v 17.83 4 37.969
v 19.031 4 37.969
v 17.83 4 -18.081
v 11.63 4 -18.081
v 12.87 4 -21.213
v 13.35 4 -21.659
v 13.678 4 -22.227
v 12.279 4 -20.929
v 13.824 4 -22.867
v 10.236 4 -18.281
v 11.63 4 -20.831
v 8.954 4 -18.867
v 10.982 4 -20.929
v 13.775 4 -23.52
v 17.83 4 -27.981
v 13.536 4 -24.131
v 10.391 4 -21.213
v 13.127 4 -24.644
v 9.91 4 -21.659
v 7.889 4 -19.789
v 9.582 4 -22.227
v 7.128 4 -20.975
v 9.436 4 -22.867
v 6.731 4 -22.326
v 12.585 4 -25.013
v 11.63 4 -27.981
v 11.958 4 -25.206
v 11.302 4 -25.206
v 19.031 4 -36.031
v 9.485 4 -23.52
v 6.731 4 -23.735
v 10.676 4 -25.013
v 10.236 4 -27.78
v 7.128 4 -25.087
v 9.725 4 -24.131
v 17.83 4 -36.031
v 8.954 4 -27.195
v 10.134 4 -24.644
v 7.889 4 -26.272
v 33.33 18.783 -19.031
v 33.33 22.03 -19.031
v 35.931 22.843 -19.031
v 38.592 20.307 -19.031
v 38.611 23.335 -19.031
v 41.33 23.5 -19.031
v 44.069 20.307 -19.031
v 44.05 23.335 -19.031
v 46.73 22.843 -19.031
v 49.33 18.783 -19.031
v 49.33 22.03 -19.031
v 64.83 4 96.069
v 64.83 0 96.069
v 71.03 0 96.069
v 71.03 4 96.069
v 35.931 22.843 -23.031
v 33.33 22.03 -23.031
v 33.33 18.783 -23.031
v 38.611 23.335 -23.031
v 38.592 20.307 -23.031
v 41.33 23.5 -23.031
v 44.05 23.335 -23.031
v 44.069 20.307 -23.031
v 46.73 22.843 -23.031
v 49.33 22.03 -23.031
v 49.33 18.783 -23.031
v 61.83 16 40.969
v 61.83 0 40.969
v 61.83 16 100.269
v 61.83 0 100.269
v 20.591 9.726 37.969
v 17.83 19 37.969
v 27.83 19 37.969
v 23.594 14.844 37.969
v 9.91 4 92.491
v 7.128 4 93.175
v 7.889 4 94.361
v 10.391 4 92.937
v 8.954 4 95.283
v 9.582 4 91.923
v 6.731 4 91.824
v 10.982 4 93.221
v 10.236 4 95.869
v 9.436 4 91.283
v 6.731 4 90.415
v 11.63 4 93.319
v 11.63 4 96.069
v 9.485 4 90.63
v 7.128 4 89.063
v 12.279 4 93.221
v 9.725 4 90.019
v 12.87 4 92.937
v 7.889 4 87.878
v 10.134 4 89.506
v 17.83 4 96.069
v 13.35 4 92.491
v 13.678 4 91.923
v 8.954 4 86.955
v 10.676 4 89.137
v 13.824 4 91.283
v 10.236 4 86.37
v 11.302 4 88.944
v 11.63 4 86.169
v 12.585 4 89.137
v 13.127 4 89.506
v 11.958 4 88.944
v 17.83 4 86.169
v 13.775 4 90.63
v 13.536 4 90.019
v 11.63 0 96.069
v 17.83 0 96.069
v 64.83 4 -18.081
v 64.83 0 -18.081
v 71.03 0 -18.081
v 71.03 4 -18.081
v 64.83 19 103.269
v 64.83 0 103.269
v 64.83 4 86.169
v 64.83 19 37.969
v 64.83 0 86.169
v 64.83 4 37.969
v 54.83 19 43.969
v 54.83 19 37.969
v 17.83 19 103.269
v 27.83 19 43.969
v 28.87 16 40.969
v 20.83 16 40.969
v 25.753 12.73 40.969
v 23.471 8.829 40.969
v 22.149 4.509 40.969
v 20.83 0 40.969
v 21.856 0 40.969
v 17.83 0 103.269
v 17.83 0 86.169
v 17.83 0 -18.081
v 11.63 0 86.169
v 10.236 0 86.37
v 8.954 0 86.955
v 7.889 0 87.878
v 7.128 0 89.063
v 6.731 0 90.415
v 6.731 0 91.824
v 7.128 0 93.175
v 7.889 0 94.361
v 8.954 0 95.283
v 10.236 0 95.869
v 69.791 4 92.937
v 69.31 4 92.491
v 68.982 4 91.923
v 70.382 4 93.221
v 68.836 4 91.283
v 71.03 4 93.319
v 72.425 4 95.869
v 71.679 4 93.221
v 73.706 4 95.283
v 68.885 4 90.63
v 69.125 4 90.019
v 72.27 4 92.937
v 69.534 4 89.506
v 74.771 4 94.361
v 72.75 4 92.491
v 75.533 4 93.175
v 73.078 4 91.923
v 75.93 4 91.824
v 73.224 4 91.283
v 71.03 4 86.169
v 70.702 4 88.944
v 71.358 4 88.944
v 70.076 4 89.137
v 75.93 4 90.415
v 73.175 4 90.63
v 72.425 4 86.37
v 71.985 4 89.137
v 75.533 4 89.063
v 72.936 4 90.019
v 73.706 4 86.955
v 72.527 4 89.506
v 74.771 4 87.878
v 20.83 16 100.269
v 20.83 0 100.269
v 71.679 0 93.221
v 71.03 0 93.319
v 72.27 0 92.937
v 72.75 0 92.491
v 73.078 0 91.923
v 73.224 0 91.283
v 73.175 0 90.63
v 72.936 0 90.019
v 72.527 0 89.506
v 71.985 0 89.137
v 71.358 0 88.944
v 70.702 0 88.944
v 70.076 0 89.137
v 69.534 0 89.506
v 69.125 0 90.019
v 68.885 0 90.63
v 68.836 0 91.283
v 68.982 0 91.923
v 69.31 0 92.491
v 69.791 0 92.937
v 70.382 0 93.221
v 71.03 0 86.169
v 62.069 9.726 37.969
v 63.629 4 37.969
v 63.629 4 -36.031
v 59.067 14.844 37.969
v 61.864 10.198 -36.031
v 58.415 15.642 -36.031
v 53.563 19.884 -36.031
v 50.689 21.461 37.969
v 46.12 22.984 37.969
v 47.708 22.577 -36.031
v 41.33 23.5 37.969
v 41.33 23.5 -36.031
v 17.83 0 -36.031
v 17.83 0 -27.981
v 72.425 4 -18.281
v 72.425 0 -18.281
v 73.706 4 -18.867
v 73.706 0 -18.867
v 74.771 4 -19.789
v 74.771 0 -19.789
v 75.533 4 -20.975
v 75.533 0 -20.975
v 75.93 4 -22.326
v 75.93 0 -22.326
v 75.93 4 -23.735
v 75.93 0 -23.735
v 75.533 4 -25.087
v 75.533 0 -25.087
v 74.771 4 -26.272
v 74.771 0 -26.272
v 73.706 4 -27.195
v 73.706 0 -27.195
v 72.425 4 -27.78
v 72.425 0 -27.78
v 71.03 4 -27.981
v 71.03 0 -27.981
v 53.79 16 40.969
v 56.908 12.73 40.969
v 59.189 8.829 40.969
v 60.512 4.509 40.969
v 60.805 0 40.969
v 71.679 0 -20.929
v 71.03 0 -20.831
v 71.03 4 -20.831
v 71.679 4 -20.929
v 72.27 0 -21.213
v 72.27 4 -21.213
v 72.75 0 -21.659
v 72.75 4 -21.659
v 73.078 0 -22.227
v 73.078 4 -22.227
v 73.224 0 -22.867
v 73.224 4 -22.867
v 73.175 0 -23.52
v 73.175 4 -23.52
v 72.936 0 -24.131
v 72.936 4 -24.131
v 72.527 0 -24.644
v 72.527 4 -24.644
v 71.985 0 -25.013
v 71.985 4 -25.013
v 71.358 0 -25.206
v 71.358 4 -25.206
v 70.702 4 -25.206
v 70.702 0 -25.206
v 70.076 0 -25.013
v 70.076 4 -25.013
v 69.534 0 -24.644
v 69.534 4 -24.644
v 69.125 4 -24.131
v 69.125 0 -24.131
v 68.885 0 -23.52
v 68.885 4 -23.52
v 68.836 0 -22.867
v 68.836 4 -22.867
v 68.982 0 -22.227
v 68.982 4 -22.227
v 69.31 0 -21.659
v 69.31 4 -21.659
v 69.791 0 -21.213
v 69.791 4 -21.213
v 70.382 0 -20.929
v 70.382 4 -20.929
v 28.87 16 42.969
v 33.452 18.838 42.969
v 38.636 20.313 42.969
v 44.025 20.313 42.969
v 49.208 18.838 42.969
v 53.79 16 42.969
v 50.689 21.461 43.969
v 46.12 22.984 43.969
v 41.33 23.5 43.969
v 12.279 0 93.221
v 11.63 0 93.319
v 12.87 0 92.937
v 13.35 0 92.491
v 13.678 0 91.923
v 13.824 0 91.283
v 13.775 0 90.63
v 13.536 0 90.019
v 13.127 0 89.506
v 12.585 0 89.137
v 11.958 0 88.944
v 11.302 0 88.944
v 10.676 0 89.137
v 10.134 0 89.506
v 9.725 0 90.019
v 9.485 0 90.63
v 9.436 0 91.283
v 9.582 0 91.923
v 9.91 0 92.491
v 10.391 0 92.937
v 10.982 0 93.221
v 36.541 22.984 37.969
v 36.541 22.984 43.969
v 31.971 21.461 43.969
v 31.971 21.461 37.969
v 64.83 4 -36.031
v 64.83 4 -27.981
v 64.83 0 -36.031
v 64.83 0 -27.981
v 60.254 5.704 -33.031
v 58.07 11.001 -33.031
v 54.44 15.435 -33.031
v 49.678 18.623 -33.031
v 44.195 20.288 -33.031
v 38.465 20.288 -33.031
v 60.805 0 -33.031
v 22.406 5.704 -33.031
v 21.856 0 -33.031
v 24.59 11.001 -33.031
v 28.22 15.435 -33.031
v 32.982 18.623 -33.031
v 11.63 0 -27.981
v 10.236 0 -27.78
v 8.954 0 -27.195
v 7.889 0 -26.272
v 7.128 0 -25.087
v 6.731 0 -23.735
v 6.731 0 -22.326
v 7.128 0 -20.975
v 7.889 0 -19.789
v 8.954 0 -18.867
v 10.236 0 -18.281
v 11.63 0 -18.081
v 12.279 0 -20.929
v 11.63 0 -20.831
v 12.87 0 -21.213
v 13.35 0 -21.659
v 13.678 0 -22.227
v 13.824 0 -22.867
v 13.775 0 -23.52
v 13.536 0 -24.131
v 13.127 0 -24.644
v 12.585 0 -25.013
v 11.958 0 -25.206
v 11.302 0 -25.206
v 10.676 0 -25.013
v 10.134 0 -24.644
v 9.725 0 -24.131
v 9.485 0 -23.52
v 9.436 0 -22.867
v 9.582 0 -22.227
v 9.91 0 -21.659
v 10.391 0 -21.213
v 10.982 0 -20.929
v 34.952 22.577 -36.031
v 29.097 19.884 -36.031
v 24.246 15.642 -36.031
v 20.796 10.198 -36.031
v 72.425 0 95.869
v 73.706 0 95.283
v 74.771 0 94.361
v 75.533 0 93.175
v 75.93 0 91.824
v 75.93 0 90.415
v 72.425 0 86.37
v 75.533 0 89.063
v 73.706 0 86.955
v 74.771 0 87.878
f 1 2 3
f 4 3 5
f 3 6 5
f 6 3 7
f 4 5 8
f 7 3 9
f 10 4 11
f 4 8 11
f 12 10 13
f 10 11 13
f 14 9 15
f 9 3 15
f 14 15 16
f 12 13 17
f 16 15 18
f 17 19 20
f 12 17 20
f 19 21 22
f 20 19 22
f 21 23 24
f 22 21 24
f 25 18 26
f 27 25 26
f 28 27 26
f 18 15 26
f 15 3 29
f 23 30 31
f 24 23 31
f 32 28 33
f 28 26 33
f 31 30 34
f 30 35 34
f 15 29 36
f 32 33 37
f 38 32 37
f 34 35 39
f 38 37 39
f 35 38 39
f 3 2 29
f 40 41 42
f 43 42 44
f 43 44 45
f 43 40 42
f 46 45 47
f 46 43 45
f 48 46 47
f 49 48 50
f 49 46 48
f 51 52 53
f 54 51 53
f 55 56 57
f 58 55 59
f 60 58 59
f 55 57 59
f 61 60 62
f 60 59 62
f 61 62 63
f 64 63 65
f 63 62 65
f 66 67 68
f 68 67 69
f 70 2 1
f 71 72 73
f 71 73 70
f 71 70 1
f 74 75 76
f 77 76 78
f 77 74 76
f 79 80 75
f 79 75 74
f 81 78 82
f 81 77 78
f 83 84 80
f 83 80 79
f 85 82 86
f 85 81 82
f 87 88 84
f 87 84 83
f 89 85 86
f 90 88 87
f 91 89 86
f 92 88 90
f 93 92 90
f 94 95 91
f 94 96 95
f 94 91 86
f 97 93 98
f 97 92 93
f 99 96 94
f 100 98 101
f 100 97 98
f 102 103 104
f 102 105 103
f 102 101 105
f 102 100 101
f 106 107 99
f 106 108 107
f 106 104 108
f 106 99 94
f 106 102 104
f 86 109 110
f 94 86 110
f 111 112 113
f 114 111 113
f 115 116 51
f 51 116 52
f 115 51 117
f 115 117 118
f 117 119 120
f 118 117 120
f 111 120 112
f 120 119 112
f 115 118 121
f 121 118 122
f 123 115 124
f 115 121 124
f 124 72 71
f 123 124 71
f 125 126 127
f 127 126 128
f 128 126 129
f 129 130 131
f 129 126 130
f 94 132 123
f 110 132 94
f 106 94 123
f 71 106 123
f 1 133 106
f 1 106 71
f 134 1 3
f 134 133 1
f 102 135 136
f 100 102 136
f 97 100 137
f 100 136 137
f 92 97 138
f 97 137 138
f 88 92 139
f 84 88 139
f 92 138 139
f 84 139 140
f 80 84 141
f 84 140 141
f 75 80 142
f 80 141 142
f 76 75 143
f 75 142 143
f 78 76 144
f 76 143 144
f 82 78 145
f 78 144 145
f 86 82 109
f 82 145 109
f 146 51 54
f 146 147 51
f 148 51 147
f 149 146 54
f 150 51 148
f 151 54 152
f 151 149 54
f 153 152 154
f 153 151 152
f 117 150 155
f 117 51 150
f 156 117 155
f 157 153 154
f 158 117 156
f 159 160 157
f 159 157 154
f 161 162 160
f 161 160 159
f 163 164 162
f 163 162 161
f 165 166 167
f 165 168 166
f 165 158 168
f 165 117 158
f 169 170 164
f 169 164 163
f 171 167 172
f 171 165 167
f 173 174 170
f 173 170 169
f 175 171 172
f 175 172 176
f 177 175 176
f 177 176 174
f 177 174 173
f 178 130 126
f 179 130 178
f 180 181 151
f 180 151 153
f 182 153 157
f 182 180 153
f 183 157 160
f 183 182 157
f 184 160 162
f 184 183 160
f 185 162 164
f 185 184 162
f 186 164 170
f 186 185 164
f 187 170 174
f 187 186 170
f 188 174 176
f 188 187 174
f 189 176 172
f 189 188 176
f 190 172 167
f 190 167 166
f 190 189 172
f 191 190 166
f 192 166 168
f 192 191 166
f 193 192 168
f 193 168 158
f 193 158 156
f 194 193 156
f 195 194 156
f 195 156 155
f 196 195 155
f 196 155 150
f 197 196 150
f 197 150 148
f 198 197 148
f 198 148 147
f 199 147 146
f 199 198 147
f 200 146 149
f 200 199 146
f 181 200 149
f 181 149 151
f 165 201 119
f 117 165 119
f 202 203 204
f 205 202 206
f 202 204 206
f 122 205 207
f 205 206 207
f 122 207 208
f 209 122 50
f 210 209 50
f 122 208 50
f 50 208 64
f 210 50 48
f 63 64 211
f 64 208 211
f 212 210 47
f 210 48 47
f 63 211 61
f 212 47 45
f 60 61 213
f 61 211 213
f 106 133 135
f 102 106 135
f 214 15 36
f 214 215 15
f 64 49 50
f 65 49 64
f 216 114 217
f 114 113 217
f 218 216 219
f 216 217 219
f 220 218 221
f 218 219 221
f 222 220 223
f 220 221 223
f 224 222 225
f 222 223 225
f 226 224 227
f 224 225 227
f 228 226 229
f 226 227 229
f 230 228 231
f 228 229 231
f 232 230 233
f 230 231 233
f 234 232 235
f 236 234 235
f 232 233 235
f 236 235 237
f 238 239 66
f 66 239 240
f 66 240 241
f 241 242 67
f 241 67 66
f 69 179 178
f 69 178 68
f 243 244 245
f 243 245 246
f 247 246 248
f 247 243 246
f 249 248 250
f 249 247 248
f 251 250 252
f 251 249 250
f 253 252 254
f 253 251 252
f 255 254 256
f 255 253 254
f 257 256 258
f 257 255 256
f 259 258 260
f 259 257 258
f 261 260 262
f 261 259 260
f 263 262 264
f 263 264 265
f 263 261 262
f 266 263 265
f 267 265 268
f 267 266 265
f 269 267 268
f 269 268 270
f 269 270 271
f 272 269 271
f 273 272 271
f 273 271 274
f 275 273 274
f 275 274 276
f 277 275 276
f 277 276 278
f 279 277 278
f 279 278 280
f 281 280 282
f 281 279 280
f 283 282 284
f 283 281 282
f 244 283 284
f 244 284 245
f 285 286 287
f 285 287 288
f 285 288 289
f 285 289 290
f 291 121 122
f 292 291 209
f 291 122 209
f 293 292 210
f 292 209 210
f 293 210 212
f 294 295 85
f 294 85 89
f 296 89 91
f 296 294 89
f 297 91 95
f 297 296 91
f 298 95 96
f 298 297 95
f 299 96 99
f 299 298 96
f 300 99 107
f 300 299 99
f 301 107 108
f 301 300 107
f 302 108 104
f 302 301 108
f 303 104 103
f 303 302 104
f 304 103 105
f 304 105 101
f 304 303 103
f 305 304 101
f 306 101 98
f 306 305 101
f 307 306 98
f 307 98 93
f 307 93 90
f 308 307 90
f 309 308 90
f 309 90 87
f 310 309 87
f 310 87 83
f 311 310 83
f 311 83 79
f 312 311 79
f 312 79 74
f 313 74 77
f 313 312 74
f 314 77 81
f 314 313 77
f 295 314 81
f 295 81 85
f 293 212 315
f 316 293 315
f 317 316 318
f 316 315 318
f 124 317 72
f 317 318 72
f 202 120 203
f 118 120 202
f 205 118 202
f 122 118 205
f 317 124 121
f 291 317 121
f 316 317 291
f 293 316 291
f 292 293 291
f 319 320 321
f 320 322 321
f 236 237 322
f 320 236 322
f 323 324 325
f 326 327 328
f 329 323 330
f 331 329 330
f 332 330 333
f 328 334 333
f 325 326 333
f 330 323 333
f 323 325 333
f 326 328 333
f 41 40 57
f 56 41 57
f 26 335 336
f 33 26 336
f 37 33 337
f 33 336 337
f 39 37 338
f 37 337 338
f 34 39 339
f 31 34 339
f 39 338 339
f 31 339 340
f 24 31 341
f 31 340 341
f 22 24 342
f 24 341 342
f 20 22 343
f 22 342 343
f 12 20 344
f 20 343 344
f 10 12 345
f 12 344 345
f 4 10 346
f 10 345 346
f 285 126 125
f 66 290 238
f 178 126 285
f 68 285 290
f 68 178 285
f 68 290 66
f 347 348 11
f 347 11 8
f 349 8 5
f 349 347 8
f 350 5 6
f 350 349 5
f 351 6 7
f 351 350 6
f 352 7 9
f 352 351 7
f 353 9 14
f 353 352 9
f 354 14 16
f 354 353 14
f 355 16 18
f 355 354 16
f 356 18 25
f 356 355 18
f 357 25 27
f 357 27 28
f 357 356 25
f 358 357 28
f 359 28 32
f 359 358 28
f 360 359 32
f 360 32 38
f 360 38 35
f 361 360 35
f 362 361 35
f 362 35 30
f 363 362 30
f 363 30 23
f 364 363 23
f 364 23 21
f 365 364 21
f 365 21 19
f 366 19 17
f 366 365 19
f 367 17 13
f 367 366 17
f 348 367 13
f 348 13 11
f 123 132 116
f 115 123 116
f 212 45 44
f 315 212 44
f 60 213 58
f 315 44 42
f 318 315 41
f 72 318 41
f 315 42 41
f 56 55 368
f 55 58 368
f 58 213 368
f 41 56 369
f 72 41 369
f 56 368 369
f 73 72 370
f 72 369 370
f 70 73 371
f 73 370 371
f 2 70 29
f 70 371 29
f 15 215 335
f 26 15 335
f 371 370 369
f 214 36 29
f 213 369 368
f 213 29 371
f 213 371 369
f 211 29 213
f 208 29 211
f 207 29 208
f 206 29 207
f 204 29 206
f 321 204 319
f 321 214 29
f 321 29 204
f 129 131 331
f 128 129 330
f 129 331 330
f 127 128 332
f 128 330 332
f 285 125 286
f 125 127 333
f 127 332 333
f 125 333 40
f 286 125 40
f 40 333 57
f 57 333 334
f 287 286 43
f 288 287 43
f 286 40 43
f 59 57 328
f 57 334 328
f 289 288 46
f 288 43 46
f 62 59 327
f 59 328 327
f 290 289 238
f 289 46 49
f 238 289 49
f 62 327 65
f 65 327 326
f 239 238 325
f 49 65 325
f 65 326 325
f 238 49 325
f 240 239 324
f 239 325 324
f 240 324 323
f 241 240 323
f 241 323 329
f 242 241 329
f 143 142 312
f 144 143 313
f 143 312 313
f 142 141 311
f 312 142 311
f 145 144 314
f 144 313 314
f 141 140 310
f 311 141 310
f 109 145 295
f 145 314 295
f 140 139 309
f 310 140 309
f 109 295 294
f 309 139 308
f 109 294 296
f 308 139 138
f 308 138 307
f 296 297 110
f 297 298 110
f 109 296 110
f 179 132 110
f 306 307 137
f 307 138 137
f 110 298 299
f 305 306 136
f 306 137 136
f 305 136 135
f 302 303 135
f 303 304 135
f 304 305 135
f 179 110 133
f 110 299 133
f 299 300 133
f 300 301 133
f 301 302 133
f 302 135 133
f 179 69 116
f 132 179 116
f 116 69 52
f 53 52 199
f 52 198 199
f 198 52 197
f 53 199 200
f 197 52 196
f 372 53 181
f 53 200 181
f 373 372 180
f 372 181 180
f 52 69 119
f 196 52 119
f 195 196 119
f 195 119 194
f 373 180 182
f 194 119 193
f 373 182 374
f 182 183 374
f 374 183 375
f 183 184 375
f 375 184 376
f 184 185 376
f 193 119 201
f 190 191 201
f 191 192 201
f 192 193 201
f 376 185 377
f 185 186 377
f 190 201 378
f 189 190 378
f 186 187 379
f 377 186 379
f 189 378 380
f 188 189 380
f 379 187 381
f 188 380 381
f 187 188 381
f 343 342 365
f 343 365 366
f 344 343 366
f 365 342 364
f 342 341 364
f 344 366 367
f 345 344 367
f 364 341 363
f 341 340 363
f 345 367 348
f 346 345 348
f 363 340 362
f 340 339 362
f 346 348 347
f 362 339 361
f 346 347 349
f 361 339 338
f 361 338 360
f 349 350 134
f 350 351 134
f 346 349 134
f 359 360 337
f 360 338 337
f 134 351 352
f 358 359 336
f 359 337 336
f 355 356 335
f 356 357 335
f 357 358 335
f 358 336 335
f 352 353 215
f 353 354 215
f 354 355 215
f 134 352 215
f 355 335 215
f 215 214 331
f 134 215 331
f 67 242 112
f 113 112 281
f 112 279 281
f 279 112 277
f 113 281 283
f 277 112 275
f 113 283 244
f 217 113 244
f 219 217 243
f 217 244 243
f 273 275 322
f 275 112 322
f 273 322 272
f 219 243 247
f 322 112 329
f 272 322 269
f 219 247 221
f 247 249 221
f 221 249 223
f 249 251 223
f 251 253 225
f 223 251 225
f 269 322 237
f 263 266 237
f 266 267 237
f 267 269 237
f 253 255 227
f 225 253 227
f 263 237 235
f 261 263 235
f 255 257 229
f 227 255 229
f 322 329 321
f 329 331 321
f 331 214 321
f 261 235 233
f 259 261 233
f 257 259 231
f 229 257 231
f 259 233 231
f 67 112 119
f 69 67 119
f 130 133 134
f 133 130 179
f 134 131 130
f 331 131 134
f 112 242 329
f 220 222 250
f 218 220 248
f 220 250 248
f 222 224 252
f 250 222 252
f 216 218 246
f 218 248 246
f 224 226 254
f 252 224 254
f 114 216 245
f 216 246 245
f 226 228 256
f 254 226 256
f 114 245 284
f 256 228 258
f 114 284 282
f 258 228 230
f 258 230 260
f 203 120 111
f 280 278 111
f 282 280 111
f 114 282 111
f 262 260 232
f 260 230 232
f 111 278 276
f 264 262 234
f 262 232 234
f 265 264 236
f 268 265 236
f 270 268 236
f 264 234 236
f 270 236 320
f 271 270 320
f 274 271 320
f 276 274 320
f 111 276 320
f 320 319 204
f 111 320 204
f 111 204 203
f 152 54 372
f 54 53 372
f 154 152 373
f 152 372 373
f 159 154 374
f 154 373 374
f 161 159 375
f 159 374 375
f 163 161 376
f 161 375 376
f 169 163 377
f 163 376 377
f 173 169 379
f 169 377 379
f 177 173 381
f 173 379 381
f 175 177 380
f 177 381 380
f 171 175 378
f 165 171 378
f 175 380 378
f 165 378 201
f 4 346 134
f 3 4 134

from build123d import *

# Parameters (mm, degrees)
SKETCH1_R               = 4.95
SKETCH1_R_2             = 2.2
BOSS_EXTRUDE1_DEPTH     = 4
SKETCH2_W               = 47
SKETCH2_H               = 139.3
BOSS_EXTRUDE2_DEPTH     = 19.5
SKETCH3_W               = 41
SKETCH3_H               = 59.3
CUT_EXTRUDE1_DEPTH      = 16
CUT_EXTRUDE3_START      = -3
SKETCH6_R               = 19.5
CUT_EXTRUDE3_DEPTH      = 76
CUT_EXTRUDE4_DEPTH      = 74
CUT_EXTRUDE6_REACH      = 110.634
CUT_EXTRUDE7_DEPTH      = 130.68327973
CUT_EXTRUDE7_DEPTH_BACK = 130.68327973
SKETCH10_W              = 16
SKETCH10_H              = 4
SKETCH12_W              = 47
SKETCH12_H              = 59.3
CUT_EXTRUDE8_DEPTH      = 130.609039197


with BuildPart() as part:
    # Sketch1 → Boss-Extrude1 (new body)
    # profile 1 of 9: a face of its own
    with BuildSketch(Plane(origin=(0, 0, 0), x_dir=(1, 0, 0), z_dir=(0, 1, 0))):
        with Locations((11.630264395, 23.030922034)):
            Circle(SKETCH1_R)
        with Locations(Location((11.630264395, 23.030922034, 0), (0, 0, 270))):
            Circle(SKETCH1_R_2, mode=Mode.SUBTRACT)
    # profile 2 of 9: a face of its own
    with BuildSketch(Plane(origin=(0, 0, 0), x_dir=(1, 0, 0), z_dir=(0, 1, 0))):
        with BuildLine():
            Line((17.830264395, 18.080922034), (17.830264395, 27.980922034))
            Line((17.830264395, 27.980922034), (11.630264395, 27.980922034))
            ThreePointArc((11.630264395, 27.980922034), (15.130442962, 26.5311006), (16.580264395, 23.030922034))
            ThreePointArc((16.580264395, 23.030922034), (15.130442962, 19.530743467), (11.630264395, 18.080922034))
            Line((11.630264395, 18.080922034), (17.830264395, 18.080922034))
        make_face()
    # profile 3 of 9: a face of its own
    with BuildSketch(Plane(origin=(0, 0, 0), x_dir=(1, 0, 0), z_dir=(0, 1, 0))):
        Polygon((64.830264395, -86.169077966), (64.830264395, 18.080922034), (64.830264395, 27.980922034), (64.830264395, 36.030922034), (17.830264395, 36.030922034), (17.830264395, 27.980922034), (17.830264395, 18.080922034), (17.830264395, -86.169077966), (17.830264395, -96.069077966), (17.830264395, -103.269077966), (64.830264395, -103.269077966), (64.830264395, -96.069077966), align=None)
    # profile 4 of 9: a face of its own
    with BuildSketch(Plane(origin=(0, 0, 0), x_dir=(1, 0, 0), z_dir=(0, 1, 0))):
        with Locations((71.030264395, 23.030922034)):
            Circle(SKETCH1_R)
        with Locations(Location((71.030264395, 23.030922034, 0), (0, 0, 270))):
            Circle(SKETCH1_R_2, mode=Mode.SUBTRACT)
    # profile 5 of 9: a face of its own
    with BuildSketch(Plane(origin=(0, 0, 0), x_dir=(1, 0, 0), z_dir=(0, 1, 0))):
        with BuildLine():
            Line((64.830264395, 18.080922034), (71.030264395, 18.080922034))
            ThreePointArc((71.030264395, 18.080922034), (66.080264395, 23.030922034), (71.030264395, 27.980922034))
            Line((71.030264395, 27.980922034), (64.830264395, 27.980922034))
            Line((64.830264395, 27.980922034), (64.830264395, 18.080922034))
        make_face()
    # profile 6 of 9: a face of its own
    with BuildSketch(Plane(origin=(0, 0, 0), x_dir=(1, 0, 0), z_dir=(0, 1, 0))):
        with BuildLine():
            Line((71.030264395, -86.169077966), (64.830264395, -86.169077966))
            Line((64.830264395, -86.169077966), (64.830264395, -96.069077966))
            Line((64.830264395, -96.069077966), (71.030264395, -96.069077966))
            ThreePointArc((71.030264395, -96.069077966), (66.080264395, -91.119077966), (71.030264395, -86.169077966))
        make_face()
    # profile 7 of 9: a face of its own
    with BuildSketch(Plane(origin=(0, 0, 0), x_dir=(1, 0, 0), z_dir=(0, 1, 0))):
        with Locations((71.030264395, -91.119077966)):
            Circle(SKETCH1_R)
        with Locations(Location((71.030264395, -91.119077966, 0), (0, 0, 270))):
            Circle(SKETCH1_R_2, mode=Mode.SUBTRACT)
    # profile 8 of 9: a face of its own
    with BuildSketch(Plane(origin=(0, 0, 0), x_dir=(1, 0, 0), z_dir=(0, 1, 0))):
        with BuildLine():
            Line((11.630264395, -96.069077966), (17.830264395, -96.069077966))
            Line((17.830264395, -96.069077966), (17.830264395, -86.169077966))
            Line((17.830264395, -86.169077966), (11.630264395, -86.169077966))
            ThreePointArc((11.630264395, -86.169077966), (15.130442962, -87.6188994), (16.580264395, -91.119077966))
            ThreePointArc((16.580264395, -91.119077966), (15.130442962, -94.619256533), (11.630264395, -96.069077966))
        make_face()
    # profile 9 of 9: a face of its own
    with BuildSketch(Plane(origin=(0, 0, 0), x_dir=(1, 0, 0), z_dir=(0, 1, 0))):
        with Locations((11.630264395, -91.119077966)):
            Circle(SKETCH1_R)
        with Locations(Location((11.630264395, -91.119077966, 0), (0, 0, 270))):
            Circle(SKETCH1_R_2, mode=Mode.SUBTRACT)
    extrude(amount=BOSS_EXTRUDE1_DEPTH)

    # Sketch2 → Boss-Extrude2 (add)
    with BuildSketch(Plane(origin=(0, 4, 0), x_dir=(1, 0, 0), z_dir=(0, 1, 0))):
        with Locations((41.330264395, -33.619077966)):
            Rectangle(SKETCH2_W, SKETCH2_H)
    extrude(amount=BOSS_EXTRUDE2_DEPTH)

    # Sketch3 → Cut-Extrude1 (cut)
    with BuildSketch(Plane.XZ):
        with Locations((41.330264395, 70.619077966)):
            Rectangle(SKETCH3_W, SKETCH3_H)
    extrude(amount=-CUT_EXTRUDE1_DEPTH, mode=Mode.SUBTRACT)

    # Sketch6 → Cut-Extrude3 (cut)
    with BuildSketch(Plane(origin=(0, 0, -36.030922034), x_dir=(-1, 0, 0), z_dir=(0, 0, -1)).offset(CUT_EXTRUDE3_START)):
        with Locations((-41.330264395, 1)):
            Circle(SKETCH6_R)
    extrude(amount=-CUT_EXTRUDE3_DEPTH, mode=Mode.SUBTRACT)

    # Sketch7 → Cut-Extrude4 (cut)
    with BuildSketch(Plane(origin=(0, 0, -36.030922034), x_dir=(-1, 0, 0), z_dir=(0, 0, -1))):
        with BuildLine():
            Line((-64.830264395, 23.5), (-64.830264395, 4))
            Line((-64.830264395, 4), (-63.629367516, 4))
            ThreePointArc((-63.629367516, 4), (-56.141577638, 17.937384686), (-41.330264395, 23.5))
            Line((-41.330264395, 23.5), (-64.830264395, 23.5))
        make_face()
        with BuildLine():
            Line((-17.830264395, 23.5), (-41.330264395, 23.5))
            ThreePointArc((-41.330264395, 23.5), (-26.518951151, 17.937384686), (-19.031161274, 4))
            Line((-19.031161274, 4), (-17.830264395, 4))
            Line((-17.830264395, 4), (-17.830264395, 23.5))
        make_face()
    extrude(amount=-CUT_EXTRUDE4_DEPTH, mode=Mode.SUBTRACT)

    # Sketch9 → Cut-Extrude6 (cut, up to next)
    with BuildSketch(Plane(origin=(0, 0, 37.969077966), x_dir=(-1, 0, 0), z_dir=(0, 0, -1)), mode=Mode.PRIVATE) as cut_extrude6_sk1:
        with BuildLine():
            Line((-64.830264395, 19), (-54.830264395, 19))
            ThreePointArc((-54.830264395, 19), (-48.44538913, 22.345374206), (-41.330264395, 23.5))
            Line((-41.330264395, 23.5), (-64.830264395, 23.5))
            Line((-64.830264395, 23.5), (-64.830264395, 19))
        make_face()
    cut_extrude6_tool1 = extrude(cut_extrude6_sk1.sketch, amount=-CUT_EXTRUDE6_REACH, mode=Mode.PRIVATE) & part.part
    # Sketch9 → Cut-Extrude6 (cut, up to next)
    with BuildSketch(Plane(origin=(0, 0, 37.969077966), x_dir=(-1, 0, 0), z_dir=(0, 0, -1)), mode=Mode.PRIVATE) as cut_extrude6_sk2:
        with BuildLine():
            Line((-27.830264395, 19), (-17.830264395, 19))
            Line((-17.830264395, 19), (-17.830264395, 23.5))
            Line((-17.830264395, 23.5), (-41.330264395, 23.5))
            ThreePointArc((-41.330264395, 23.5), (-34.215139659, 22.345374206), (-27.830264395, 19))
        make_face()
    cut_extrude6_tool2 = extrude(cut_extrude6_sk2.sketch, amount=-CUT_EXTRUDE6_REACH, mode=Mode.PRIVATE) & part.part
    add(cut_extrude6_tool1.solids().sort_by_distance((57.332082, 21.52882, 37.969078))[0], mode=Mode.SUBTRACT)
    add(cut_extrude6_tool2.solids().sort_by_distance((25.328447, 21.52882, 37.969078))[0], mode=Mode.SUBTRACT)

    # Sketch10 → Cut-Extrude7 (cut, two sides: drawn at the far end of the back side and taken through both)
    with BuildSketch(Plane(origin=(0, 4, 0), x_dir=(1, 0, 0), z_dir=(0, 1, 0)).offset(-CUT_EXTRUDE7_DEPTH_BACK)):
        with Locations((41.330264395, 21.030922034)):
            Rectangle(SKETCH10_W, SKETCH10_H)
    extrude(amount=CUT_EXTRUDE7_DEPTH + CUT_EXTRUDE7_DEPTH_BACK, mode=Mode.SUBTRACT)

    # Sketch12 → Cut-Extrude8 (cut, through all)
    with BuildSketch(Plane(origin=(0, 19, 0), x_dir=(1, 0, 0), z_dir=(0, 1, 0))):
        with Locations((41.330264395, -73.619077966)):
            Rectangle(SKETCH12_W, SKETCH12_H)
    extrude(amount=CUT_EXTRUDE8_DEPTH, mode=Mode.SUBTRACT)


solid = part.part
